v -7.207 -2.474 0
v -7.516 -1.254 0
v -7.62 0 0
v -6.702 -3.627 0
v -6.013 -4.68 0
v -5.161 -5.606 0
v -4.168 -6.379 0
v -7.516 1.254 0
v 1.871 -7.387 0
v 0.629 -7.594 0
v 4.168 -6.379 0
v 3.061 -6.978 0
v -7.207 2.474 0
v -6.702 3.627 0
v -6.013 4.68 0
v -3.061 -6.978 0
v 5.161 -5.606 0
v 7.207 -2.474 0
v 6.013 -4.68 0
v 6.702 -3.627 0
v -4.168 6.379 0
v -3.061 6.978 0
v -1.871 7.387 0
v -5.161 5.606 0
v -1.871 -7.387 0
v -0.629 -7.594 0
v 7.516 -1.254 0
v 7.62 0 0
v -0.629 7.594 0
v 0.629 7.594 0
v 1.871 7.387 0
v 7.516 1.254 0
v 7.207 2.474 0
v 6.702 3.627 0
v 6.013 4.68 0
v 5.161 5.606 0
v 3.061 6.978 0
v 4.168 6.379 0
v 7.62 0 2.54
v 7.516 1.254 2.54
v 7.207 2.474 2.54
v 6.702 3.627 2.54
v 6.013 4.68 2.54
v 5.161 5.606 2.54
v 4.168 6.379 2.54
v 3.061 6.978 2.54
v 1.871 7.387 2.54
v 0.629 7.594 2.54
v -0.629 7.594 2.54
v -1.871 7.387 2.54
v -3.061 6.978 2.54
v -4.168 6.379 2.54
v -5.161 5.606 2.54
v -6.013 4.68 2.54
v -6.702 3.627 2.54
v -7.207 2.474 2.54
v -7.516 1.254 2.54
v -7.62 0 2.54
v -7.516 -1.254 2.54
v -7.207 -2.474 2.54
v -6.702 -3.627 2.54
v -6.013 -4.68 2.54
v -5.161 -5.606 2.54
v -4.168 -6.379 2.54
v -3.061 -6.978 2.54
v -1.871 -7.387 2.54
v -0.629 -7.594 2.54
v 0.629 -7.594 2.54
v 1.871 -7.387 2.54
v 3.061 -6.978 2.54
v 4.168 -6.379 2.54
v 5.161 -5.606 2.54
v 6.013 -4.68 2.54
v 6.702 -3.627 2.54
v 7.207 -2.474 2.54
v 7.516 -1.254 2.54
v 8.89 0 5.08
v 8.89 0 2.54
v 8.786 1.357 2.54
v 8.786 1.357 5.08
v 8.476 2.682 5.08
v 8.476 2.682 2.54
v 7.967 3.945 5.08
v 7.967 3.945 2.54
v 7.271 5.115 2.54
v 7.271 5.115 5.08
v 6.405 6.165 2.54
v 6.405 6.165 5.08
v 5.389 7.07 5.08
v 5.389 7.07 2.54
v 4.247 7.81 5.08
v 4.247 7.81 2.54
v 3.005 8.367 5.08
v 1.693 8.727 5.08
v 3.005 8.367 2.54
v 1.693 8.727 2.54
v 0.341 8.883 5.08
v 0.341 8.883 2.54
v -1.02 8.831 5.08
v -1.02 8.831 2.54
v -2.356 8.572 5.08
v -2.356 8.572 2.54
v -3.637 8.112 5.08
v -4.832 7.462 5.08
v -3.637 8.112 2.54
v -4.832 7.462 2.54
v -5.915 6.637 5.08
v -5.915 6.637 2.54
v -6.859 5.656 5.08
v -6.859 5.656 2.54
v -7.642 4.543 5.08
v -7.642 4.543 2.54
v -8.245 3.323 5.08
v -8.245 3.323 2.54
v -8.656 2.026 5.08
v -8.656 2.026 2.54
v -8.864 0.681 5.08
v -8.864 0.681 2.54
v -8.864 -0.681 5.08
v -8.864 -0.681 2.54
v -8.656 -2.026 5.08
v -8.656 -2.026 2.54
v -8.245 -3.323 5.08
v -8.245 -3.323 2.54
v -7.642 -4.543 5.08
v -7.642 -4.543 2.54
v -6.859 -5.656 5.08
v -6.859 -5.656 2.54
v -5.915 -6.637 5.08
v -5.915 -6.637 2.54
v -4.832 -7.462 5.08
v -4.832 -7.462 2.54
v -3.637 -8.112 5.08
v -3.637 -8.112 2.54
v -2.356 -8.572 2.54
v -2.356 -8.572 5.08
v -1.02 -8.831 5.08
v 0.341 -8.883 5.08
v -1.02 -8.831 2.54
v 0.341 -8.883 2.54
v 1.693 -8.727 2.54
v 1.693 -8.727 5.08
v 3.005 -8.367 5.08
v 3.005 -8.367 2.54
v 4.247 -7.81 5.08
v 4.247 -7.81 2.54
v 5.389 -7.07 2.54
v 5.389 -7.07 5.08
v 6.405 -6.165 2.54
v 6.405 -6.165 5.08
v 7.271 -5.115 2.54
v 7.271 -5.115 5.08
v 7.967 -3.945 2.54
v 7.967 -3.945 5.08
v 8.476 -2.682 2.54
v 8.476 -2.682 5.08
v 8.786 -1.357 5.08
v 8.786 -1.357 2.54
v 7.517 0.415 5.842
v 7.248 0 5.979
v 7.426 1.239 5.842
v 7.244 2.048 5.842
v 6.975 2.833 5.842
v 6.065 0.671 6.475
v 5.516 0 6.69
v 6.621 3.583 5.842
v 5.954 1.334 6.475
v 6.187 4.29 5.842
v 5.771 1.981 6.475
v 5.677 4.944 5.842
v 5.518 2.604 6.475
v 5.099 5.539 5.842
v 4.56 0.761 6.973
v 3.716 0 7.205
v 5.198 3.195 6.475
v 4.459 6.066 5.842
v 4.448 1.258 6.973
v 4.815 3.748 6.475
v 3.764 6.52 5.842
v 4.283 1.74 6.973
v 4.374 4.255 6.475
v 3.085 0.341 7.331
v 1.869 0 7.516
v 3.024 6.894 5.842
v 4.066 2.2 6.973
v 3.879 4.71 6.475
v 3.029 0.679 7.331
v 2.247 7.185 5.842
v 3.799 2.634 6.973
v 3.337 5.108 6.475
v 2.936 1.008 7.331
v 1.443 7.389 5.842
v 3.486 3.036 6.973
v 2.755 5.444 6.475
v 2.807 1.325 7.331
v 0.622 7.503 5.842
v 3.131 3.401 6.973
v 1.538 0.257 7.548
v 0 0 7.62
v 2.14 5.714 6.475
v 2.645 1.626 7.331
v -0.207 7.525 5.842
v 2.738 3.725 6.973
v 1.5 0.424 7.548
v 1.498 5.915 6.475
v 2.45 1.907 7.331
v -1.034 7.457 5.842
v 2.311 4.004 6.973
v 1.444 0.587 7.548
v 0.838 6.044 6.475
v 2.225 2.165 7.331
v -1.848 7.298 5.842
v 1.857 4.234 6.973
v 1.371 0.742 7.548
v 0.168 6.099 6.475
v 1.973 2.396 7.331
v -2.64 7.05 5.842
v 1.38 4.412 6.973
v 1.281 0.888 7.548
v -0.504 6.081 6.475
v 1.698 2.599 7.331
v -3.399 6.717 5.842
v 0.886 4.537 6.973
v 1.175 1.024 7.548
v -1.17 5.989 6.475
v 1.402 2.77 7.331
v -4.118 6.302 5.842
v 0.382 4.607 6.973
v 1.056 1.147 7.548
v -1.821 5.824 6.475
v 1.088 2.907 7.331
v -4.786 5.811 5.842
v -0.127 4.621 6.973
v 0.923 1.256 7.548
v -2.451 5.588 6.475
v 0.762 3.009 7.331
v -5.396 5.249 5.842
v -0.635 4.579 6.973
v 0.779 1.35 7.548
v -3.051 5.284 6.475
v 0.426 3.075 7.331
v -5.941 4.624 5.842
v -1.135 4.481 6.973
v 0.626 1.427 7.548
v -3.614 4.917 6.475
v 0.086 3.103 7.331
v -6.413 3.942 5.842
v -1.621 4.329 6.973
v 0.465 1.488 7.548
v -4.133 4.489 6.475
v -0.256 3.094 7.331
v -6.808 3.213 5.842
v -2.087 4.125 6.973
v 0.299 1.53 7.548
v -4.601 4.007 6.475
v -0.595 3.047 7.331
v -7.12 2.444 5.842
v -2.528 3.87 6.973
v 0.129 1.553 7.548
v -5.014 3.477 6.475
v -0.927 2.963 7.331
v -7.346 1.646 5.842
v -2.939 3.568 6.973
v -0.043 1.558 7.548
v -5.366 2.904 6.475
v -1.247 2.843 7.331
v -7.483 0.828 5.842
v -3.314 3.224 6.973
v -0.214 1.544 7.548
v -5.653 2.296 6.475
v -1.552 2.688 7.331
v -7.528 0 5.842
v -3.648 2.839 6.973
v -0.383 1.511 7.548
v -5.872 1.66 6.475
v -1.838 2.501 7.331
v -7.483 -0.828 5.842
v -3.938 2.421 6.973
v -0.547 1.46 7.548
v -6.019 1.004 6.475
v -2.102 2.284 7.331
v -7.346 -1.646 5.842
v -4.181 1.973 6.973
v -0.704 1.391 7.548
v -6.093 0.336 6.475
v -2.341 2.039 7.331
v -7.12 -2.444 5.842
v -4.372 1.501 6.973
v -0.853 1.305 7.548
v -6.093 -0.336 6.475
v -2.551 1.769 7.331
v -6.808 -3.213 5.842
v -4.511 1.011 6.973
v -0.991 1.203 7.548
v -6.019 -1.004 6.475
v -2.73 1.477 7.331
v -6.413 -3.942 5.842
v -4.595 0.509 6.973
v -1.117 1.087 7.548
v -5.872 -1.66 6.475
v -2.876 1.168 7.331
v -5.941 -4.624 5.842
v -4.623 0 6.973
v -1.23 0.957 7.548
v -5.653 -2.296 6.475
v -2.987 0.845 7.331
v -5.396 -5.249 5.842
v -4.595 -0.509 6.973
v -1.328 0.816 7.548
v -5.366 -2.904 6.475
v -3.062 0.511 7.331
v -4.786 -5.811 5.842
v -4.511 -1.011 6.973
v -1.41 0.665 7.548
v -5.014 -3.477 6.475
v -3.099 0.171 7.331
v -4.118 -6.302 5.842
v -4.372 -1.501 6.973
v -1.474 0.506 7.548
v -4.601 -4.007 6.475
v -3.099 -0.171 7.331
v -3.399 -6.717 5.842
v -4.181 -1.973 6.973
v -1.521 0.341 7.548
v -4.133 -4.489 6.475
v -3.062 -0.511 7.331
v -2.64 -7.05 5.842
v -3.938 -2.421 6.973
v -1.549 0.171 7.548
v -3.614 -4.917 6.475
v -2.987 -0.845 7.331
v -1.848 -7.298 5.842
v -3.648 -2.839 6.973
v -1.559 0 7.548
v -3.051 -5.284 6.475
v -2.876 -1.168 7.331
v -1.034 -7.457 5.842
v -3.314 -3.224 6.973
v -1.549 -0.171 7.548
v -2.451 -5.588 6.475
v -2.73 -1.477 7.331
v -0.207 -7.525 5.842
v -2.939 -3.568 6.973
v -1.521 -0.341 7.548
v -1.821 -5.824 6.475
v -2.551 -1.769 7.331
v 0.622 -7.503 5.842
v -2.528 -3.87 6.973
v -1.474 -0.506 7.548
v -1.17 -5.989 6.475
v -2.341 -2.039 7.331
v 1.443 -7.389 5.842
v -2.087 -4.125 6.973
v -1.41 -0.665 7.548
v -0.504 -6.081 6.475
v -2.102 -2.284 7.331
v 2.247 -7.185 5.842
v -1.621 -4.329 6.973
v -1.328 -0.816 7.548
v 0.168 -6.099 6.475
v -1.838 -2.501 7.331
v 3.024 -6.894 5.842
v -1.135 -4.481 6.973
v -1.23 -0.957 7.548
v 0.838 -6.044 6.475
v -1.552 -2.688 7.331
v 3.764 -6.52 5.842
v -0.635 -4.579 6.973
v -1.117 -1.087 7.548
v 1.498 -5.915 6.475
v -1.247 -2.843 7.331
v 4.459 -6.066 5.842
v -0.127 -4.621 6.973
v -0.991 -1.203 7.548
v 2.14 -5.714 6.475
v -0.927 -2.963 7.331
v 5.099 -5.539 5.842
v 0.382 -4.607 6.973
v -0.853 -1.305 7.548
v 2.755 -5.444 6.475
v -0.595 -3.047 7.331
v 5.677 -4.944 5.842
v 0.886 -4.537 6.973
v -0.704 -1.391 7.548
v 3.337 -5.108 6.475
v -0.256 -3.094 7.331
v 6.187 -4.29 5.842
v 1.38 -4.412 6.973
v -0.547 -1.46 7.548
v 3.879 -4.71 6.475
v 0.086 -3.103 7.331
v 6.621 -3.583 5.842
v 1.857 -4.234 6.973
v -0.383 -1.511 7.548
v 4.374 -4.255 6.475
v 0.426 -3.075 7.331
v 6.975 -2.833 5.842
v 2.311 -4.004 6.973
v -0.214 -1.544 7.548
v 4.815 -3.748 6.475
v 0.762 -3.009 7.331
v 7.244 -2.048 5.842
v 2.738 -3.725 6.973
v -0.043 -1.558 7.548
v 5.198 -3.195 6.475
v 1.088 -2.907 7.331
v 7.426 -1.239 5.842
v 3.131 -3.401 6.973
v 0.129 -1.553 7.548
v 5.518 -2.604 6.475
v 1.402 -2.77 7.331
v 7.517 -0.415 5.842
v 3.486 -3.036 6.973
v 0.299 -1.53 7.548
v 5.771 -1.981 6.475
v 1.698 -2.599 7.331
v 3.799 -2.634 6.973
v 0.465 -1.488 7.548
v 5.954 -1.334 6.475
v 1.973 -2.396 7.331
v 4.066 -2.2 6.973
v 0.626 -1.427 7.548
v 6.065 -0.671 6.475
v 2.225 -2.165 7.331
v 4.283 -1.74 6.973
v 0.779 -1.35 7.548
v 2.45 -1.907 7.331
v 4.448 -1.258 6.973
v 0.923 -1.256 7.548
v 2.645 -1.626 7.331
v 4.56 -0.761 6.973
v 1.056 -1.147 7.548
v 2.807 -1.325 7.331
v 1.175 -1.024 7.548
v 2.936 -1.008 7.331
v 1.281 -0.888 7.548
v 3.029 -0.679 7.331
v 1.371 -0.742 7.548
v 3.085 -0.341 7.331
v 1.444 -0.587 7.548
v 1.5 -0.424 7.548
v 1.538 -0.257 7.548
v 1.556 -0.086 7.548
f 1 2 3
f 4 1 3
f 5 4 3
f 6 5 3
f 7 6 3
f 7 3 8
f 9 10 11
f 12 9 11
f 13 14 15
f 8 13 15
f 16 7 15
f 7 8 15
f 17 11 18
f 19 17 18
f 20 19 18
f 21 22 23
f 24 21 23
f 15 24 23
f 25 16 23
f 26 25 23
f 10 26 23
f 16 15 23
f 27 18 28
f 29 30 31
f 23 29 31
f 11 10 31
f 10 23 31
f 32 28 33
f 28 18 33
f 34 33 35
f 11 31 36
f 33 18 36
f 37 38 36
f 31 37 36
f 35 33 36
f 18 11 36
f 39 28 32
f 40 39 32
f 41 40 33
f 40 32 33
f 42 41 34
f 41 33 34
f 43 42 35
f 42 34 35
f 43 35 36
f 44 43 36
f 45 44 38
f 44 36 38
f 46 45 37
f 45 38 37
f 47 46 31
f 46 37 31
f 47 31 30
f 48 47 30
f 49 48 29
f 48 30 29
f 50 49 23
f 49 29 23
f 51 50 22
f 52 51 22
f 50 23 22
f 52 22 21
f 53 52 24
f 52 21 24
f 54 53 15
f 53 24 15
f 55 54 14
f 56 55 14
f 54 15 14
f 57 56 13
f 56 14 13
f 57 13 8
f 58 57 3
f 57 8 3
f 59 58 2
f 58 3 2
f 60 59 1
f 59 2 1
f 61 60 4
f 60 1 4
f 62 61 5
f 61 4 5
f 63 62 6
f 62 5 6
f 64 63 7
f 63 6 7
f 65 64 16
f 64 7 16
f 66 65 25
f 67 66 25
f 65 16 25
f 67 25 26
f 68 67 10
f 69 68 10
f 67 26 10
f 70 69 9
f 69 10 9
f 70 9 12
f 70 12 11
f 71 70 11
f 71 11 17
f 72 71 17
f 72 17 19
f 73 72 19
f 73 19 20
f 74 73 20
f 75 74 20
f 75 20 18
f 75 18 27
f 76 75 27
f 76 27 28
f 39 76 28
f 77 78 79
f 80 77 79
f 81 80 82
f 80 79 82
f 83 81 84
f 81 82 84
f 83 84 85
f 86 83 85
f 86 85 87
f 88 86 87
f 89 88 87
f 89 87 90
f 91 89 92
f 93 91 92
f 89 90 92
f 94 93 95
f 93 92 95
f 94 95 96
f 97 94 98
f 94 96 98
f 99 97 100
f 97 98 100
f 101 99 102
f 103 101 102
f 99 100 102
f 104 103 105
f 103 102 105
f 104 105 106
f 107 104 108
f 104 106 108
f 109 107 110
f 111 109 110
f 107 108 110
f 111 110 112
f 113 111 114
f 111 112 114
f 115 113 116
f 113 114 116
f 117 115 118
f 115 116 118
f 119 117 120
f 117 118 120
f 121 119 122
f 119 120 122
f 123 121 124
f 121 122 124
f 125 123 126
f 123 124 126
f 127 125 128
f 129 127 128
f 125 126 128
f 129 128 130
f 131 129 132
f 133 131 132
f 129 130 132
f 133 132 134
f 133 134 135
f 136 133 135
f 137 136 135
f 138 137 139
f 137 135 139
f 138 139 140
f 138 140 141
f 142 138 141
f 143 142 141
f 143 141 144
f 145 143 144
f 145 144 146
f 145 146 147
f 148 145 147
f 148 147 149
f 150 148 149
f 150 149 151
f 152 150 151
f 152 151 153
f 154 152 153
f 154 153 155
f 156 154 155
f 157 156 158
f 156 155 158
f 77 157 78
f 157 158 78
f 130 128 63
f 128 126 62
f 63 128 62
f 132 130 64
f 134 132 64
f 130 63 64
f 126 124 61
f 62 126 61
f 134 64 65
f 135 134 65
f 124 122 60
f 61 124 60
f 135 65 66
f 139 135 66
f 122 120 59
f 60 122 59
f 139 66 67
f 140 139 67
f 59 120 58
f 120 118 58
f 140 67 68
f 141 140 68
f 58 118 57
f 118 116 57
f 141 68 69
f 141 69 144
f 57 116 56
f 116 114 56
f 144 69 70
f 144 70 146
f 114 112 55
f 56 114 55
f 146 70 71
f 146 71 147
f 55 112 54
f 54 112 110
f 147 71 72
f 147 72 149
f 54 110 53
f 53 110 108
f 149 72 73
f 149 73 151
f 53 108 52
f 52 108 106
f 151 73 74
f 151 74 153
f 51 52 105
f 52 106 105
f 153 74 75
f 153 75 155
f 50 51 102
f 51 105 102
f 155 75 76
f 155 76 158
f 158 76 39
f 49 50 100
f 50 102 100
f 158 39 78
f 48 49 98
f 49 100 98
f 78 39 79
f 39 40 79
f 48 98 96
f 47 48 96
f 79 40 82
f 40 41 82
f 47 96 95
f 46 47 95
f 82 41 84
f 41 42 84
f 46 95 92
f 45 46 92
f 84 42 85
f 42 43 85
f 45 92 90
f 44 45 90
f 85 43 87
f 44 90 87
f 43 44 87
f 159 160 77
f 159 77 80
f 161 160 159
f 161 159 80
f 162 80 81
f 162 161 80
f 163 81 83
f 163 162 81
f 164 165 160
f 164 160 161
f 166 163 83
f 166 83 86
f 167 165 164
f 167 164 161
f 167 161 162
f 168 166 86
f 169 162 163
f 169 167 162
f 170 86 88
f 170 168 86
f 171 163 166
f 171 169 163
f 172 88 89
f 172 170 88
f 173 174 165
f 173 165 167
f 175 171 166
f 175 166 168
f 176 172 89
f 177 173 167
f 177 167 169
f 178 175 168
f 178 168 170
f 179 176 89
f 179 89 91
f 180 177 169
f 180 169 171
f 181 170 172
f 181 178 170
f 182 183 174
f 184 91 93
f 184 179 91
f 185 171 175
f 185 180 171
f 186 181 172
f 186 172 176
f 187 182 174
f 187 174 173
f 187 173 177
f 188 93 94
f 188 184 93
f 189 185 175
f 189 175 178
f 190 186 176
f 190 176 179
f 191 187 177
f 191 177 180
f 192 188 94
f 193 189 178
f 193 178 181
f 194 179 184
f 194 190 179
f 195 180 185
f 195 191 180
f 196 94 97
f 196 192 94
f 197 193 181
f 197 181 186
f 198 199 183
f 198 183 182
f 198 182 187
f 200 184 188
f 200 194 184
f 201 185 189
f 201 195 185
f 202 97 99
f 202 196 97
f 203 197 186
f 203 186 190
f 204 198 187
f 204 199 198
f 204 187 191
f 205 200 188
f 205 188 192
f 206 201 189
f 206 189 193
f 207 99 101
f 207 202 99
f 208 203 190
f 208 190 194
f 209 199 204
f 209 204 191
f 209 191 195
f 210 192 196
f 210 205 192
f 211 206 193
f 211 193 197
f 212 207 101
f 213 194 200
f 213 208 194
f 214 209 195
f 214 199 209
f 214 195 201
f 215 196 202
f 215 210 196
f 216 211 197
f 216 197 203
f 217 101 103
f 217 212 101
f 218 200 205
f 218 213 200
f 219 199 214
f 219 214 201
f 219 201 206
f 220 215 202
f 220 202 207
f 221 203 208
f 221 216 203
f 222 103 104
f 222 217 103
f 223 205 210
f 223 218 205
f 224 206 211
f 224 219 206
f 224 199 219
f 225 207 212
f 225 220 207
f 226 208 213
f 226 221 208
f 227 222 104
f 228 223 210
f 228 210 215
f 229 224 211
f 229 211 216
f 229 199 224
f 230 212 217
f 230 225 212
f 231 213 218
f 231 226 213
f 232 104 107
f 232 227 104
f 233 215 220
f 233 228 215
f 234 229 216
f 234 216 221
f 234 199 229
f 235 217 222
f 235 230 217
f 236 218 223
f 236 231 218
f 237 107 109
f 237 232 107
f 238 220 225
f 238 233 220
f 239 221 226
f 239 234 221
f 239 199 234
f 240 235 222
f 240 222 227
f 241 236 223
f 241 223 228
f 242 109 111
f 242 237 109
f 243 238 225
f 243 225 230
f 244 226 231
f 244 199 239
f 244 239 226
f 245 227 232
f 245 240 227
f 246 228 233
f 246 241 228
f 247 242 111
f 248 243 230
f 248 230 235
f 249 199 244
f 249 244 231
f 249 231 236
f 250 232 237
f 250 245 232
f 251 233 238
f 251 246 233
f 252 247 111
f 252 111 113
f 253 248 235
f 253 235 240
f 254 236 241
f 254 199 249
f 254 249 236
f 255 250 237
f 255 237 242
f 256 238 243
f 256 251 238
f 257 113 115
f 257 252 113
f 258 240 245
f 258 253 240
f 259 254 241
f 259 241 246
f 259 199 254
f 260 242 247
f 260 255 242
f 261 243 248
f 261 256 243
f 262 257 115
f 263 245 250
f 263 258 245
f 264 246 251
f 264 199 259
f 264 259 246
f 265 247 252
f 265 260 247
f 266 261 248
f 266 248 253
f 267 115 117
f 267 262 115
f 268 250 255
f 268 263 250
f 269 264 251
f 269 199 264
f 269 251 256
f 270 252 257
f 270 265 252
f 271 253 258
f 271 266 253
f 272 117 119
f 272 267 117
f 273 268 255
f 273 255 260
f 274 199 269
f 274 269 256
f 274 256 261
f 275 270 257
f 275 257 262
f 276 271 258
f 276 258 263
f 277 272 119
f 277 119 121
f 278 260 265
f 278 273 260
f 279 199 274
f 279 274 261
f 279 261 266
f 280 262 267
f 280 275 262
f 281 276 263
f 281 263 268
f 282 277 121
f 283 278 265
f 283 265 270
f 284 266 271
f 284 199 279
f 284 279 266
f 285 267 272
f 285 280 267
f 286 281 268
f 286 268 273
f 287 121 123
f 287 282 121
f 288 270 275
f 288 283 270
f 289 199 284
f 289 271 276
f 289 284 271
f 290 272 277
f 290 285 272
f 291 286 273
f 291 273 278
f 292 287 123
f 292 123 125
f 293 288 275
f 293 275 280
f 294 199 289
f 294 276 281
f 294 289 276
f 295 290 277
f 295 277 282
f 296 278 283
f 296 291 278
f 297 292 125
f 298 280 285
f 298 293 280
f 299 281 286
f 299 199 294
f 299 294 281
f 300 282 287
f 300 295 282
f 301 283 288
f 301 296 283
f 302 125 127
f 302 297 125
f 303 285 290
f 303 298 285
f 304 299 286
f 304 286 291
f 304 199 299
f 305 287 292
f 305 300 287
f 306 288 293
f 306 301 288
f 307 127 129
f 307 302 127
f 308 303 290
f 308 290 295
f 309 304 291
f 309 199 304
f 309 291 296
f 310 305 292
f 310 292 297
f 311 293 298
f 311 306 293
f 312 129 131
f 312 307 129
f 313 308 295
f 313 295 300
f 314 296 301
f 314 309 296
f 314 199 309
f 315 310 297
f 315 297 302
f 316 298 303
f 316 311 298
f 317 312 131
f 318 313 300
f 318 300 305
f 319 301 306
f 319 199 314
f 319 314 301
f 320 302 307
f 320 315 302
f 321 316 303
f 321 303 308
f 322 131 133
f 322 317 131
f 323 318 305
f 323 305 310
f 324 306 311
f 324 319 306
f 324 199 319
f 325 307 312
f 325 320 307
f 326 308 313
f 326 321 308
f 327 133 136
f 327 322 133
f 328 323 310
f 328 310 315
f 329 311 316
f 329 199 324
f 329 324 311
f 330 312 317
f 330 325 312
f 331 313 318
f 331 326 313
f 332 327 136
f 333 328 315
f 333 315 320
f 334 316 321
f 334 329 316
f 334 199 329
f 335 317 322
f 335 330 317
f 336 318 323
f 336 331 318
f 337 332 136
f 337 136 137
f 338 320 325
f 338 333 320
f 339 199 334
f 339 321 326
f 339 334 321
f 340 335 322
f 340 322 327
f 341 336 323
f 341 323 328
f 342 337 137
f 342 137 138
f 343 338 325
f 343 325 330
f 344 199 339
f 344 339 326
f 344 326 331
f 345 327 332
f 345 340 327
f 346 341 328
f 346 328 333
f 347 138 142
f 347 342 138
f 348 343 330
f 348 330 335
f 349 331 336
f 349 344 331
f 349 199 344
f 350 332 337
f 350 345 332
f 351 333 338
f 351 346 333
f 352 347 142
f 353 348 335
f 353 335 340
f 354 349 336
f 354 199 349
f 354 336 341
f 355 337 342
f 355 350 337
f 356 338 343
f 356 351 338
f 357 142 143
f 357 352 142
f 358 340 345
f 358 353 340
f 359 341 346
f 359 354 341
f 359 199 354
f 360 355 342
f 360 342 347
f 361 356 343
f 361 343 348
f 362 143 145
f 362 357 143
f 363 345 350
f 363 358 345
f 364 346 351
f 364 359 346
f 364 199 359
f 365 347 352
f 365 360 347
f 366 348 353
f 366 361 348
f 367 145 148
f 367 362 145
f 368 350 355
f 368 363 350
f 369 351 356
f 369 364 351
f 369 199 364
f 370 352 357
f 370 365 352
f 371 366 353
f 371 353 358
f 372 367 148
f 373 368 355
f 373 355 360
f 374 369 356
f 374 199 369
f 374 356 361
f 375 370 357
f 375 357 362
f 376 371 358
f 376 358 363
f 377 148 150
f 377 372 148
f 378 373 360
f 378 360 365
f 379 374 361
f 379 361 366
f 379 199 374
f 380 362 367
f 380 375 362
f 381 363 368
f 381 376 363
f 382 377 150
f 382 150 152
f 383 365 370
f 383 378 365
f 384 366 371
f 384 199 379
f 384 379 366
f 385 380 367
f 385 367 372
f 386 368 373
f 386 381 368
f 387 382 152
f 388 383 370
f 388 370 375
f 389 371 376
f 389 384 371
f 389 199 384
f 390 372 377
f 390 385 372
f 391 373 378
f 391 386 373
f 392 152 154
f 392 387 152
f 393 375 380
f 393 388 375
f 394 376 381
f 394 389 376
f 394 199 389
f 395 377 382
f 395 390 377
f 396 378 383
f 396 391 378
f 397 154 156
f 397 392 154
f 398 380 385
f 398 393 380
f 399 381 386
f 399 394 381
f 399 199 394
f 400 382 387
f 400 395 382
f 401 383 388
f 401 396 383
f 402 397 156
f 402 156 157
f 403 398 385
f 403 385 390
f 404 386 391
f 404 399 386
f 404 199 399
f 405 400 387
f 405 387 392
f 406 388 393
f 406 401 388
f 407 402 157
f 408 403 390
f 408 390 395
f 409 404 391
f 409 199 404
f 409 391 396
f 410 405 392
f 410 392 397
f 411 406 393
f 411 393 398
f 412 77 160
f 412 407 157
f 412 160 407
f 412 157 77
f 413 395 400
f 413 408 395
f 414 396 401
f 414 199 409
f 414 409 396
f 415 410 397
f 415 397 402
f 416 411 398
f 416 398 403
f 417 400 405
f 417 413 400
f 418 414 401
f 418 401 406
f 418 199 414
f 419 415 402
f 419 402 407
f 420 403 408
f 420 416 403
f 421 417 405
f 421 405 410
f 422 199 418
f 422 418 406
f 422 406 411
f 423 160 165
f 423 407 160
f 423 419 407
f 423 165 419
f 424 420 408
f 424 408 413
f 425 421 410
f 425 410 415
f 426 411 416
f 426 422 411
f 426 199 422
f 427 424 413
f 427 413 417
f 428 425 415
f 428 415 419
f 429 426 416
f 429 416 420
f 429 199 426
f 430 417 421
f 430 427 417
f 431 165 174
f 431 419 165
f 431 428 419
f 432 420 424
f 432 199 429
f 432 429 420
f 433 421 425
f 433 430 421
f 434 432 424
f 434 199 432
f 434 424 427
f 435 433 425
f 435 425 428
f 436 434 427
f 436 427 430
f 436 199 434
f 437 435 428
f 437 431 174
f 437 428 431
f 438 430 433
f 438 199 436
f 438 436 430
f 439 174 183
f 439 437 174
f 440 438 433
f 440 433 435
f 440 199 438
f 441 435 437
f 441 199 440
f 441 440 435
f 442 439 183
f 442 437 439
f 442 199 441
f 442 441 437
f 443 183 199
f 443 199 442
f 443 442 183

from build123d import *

# Parameters (mm, degrees)
SKETCH1_R         = 7.62
EXTRUDE1_DEPTH    = 2.54
SKETCH2_R         = 8.89
EXTRUDE2_DEPTH    = 2.54
DOME1_FACE_RADIUS = 8.89
DOME1_HEIGHT      = 2.54


with BuildPart() as part:
    # Sketch1 → Extrude1 (new body)
    with BuildSketch(Plane.XY):
        Circle(SKETCH1_R)
    extrude(amount=EXTRUDE1_DEPTH)

    # Sketch2 → Extrude2 (add)
    with BuildSketch(Plane.XY.offset(2.54)):
        Circle(SKETCH2_R)
    extrude(amount=EXTRUDE2_DEPTH)

    # Dome1: a dome of height H over a round flat face of radius A is a cap of a sphere of radius (A * A + H * H) / (2 * H)
    dome1_r = (DOME1_FACE_RADIUS * DOME1_FACE_RADIUS + DOME1_HEIGHT * DOME1_HEIGHT) / (2 * DOME1_HEIGHT)
    dome1_base = Plane((0, 0, 5.08), z_dir=(0, 0, 1))
    with Locations(dome1_base.offset(DOME1_HEIGHT - dome1_r)):
        dome1_ball = Sphere(dome1_r, mode=Mode.PRIVATE)
    add(split(dome1_ball, bisect_by=dome1_base, keep=Keep.TOP, mode=Mode.PRIVATE))


solid = part.part
